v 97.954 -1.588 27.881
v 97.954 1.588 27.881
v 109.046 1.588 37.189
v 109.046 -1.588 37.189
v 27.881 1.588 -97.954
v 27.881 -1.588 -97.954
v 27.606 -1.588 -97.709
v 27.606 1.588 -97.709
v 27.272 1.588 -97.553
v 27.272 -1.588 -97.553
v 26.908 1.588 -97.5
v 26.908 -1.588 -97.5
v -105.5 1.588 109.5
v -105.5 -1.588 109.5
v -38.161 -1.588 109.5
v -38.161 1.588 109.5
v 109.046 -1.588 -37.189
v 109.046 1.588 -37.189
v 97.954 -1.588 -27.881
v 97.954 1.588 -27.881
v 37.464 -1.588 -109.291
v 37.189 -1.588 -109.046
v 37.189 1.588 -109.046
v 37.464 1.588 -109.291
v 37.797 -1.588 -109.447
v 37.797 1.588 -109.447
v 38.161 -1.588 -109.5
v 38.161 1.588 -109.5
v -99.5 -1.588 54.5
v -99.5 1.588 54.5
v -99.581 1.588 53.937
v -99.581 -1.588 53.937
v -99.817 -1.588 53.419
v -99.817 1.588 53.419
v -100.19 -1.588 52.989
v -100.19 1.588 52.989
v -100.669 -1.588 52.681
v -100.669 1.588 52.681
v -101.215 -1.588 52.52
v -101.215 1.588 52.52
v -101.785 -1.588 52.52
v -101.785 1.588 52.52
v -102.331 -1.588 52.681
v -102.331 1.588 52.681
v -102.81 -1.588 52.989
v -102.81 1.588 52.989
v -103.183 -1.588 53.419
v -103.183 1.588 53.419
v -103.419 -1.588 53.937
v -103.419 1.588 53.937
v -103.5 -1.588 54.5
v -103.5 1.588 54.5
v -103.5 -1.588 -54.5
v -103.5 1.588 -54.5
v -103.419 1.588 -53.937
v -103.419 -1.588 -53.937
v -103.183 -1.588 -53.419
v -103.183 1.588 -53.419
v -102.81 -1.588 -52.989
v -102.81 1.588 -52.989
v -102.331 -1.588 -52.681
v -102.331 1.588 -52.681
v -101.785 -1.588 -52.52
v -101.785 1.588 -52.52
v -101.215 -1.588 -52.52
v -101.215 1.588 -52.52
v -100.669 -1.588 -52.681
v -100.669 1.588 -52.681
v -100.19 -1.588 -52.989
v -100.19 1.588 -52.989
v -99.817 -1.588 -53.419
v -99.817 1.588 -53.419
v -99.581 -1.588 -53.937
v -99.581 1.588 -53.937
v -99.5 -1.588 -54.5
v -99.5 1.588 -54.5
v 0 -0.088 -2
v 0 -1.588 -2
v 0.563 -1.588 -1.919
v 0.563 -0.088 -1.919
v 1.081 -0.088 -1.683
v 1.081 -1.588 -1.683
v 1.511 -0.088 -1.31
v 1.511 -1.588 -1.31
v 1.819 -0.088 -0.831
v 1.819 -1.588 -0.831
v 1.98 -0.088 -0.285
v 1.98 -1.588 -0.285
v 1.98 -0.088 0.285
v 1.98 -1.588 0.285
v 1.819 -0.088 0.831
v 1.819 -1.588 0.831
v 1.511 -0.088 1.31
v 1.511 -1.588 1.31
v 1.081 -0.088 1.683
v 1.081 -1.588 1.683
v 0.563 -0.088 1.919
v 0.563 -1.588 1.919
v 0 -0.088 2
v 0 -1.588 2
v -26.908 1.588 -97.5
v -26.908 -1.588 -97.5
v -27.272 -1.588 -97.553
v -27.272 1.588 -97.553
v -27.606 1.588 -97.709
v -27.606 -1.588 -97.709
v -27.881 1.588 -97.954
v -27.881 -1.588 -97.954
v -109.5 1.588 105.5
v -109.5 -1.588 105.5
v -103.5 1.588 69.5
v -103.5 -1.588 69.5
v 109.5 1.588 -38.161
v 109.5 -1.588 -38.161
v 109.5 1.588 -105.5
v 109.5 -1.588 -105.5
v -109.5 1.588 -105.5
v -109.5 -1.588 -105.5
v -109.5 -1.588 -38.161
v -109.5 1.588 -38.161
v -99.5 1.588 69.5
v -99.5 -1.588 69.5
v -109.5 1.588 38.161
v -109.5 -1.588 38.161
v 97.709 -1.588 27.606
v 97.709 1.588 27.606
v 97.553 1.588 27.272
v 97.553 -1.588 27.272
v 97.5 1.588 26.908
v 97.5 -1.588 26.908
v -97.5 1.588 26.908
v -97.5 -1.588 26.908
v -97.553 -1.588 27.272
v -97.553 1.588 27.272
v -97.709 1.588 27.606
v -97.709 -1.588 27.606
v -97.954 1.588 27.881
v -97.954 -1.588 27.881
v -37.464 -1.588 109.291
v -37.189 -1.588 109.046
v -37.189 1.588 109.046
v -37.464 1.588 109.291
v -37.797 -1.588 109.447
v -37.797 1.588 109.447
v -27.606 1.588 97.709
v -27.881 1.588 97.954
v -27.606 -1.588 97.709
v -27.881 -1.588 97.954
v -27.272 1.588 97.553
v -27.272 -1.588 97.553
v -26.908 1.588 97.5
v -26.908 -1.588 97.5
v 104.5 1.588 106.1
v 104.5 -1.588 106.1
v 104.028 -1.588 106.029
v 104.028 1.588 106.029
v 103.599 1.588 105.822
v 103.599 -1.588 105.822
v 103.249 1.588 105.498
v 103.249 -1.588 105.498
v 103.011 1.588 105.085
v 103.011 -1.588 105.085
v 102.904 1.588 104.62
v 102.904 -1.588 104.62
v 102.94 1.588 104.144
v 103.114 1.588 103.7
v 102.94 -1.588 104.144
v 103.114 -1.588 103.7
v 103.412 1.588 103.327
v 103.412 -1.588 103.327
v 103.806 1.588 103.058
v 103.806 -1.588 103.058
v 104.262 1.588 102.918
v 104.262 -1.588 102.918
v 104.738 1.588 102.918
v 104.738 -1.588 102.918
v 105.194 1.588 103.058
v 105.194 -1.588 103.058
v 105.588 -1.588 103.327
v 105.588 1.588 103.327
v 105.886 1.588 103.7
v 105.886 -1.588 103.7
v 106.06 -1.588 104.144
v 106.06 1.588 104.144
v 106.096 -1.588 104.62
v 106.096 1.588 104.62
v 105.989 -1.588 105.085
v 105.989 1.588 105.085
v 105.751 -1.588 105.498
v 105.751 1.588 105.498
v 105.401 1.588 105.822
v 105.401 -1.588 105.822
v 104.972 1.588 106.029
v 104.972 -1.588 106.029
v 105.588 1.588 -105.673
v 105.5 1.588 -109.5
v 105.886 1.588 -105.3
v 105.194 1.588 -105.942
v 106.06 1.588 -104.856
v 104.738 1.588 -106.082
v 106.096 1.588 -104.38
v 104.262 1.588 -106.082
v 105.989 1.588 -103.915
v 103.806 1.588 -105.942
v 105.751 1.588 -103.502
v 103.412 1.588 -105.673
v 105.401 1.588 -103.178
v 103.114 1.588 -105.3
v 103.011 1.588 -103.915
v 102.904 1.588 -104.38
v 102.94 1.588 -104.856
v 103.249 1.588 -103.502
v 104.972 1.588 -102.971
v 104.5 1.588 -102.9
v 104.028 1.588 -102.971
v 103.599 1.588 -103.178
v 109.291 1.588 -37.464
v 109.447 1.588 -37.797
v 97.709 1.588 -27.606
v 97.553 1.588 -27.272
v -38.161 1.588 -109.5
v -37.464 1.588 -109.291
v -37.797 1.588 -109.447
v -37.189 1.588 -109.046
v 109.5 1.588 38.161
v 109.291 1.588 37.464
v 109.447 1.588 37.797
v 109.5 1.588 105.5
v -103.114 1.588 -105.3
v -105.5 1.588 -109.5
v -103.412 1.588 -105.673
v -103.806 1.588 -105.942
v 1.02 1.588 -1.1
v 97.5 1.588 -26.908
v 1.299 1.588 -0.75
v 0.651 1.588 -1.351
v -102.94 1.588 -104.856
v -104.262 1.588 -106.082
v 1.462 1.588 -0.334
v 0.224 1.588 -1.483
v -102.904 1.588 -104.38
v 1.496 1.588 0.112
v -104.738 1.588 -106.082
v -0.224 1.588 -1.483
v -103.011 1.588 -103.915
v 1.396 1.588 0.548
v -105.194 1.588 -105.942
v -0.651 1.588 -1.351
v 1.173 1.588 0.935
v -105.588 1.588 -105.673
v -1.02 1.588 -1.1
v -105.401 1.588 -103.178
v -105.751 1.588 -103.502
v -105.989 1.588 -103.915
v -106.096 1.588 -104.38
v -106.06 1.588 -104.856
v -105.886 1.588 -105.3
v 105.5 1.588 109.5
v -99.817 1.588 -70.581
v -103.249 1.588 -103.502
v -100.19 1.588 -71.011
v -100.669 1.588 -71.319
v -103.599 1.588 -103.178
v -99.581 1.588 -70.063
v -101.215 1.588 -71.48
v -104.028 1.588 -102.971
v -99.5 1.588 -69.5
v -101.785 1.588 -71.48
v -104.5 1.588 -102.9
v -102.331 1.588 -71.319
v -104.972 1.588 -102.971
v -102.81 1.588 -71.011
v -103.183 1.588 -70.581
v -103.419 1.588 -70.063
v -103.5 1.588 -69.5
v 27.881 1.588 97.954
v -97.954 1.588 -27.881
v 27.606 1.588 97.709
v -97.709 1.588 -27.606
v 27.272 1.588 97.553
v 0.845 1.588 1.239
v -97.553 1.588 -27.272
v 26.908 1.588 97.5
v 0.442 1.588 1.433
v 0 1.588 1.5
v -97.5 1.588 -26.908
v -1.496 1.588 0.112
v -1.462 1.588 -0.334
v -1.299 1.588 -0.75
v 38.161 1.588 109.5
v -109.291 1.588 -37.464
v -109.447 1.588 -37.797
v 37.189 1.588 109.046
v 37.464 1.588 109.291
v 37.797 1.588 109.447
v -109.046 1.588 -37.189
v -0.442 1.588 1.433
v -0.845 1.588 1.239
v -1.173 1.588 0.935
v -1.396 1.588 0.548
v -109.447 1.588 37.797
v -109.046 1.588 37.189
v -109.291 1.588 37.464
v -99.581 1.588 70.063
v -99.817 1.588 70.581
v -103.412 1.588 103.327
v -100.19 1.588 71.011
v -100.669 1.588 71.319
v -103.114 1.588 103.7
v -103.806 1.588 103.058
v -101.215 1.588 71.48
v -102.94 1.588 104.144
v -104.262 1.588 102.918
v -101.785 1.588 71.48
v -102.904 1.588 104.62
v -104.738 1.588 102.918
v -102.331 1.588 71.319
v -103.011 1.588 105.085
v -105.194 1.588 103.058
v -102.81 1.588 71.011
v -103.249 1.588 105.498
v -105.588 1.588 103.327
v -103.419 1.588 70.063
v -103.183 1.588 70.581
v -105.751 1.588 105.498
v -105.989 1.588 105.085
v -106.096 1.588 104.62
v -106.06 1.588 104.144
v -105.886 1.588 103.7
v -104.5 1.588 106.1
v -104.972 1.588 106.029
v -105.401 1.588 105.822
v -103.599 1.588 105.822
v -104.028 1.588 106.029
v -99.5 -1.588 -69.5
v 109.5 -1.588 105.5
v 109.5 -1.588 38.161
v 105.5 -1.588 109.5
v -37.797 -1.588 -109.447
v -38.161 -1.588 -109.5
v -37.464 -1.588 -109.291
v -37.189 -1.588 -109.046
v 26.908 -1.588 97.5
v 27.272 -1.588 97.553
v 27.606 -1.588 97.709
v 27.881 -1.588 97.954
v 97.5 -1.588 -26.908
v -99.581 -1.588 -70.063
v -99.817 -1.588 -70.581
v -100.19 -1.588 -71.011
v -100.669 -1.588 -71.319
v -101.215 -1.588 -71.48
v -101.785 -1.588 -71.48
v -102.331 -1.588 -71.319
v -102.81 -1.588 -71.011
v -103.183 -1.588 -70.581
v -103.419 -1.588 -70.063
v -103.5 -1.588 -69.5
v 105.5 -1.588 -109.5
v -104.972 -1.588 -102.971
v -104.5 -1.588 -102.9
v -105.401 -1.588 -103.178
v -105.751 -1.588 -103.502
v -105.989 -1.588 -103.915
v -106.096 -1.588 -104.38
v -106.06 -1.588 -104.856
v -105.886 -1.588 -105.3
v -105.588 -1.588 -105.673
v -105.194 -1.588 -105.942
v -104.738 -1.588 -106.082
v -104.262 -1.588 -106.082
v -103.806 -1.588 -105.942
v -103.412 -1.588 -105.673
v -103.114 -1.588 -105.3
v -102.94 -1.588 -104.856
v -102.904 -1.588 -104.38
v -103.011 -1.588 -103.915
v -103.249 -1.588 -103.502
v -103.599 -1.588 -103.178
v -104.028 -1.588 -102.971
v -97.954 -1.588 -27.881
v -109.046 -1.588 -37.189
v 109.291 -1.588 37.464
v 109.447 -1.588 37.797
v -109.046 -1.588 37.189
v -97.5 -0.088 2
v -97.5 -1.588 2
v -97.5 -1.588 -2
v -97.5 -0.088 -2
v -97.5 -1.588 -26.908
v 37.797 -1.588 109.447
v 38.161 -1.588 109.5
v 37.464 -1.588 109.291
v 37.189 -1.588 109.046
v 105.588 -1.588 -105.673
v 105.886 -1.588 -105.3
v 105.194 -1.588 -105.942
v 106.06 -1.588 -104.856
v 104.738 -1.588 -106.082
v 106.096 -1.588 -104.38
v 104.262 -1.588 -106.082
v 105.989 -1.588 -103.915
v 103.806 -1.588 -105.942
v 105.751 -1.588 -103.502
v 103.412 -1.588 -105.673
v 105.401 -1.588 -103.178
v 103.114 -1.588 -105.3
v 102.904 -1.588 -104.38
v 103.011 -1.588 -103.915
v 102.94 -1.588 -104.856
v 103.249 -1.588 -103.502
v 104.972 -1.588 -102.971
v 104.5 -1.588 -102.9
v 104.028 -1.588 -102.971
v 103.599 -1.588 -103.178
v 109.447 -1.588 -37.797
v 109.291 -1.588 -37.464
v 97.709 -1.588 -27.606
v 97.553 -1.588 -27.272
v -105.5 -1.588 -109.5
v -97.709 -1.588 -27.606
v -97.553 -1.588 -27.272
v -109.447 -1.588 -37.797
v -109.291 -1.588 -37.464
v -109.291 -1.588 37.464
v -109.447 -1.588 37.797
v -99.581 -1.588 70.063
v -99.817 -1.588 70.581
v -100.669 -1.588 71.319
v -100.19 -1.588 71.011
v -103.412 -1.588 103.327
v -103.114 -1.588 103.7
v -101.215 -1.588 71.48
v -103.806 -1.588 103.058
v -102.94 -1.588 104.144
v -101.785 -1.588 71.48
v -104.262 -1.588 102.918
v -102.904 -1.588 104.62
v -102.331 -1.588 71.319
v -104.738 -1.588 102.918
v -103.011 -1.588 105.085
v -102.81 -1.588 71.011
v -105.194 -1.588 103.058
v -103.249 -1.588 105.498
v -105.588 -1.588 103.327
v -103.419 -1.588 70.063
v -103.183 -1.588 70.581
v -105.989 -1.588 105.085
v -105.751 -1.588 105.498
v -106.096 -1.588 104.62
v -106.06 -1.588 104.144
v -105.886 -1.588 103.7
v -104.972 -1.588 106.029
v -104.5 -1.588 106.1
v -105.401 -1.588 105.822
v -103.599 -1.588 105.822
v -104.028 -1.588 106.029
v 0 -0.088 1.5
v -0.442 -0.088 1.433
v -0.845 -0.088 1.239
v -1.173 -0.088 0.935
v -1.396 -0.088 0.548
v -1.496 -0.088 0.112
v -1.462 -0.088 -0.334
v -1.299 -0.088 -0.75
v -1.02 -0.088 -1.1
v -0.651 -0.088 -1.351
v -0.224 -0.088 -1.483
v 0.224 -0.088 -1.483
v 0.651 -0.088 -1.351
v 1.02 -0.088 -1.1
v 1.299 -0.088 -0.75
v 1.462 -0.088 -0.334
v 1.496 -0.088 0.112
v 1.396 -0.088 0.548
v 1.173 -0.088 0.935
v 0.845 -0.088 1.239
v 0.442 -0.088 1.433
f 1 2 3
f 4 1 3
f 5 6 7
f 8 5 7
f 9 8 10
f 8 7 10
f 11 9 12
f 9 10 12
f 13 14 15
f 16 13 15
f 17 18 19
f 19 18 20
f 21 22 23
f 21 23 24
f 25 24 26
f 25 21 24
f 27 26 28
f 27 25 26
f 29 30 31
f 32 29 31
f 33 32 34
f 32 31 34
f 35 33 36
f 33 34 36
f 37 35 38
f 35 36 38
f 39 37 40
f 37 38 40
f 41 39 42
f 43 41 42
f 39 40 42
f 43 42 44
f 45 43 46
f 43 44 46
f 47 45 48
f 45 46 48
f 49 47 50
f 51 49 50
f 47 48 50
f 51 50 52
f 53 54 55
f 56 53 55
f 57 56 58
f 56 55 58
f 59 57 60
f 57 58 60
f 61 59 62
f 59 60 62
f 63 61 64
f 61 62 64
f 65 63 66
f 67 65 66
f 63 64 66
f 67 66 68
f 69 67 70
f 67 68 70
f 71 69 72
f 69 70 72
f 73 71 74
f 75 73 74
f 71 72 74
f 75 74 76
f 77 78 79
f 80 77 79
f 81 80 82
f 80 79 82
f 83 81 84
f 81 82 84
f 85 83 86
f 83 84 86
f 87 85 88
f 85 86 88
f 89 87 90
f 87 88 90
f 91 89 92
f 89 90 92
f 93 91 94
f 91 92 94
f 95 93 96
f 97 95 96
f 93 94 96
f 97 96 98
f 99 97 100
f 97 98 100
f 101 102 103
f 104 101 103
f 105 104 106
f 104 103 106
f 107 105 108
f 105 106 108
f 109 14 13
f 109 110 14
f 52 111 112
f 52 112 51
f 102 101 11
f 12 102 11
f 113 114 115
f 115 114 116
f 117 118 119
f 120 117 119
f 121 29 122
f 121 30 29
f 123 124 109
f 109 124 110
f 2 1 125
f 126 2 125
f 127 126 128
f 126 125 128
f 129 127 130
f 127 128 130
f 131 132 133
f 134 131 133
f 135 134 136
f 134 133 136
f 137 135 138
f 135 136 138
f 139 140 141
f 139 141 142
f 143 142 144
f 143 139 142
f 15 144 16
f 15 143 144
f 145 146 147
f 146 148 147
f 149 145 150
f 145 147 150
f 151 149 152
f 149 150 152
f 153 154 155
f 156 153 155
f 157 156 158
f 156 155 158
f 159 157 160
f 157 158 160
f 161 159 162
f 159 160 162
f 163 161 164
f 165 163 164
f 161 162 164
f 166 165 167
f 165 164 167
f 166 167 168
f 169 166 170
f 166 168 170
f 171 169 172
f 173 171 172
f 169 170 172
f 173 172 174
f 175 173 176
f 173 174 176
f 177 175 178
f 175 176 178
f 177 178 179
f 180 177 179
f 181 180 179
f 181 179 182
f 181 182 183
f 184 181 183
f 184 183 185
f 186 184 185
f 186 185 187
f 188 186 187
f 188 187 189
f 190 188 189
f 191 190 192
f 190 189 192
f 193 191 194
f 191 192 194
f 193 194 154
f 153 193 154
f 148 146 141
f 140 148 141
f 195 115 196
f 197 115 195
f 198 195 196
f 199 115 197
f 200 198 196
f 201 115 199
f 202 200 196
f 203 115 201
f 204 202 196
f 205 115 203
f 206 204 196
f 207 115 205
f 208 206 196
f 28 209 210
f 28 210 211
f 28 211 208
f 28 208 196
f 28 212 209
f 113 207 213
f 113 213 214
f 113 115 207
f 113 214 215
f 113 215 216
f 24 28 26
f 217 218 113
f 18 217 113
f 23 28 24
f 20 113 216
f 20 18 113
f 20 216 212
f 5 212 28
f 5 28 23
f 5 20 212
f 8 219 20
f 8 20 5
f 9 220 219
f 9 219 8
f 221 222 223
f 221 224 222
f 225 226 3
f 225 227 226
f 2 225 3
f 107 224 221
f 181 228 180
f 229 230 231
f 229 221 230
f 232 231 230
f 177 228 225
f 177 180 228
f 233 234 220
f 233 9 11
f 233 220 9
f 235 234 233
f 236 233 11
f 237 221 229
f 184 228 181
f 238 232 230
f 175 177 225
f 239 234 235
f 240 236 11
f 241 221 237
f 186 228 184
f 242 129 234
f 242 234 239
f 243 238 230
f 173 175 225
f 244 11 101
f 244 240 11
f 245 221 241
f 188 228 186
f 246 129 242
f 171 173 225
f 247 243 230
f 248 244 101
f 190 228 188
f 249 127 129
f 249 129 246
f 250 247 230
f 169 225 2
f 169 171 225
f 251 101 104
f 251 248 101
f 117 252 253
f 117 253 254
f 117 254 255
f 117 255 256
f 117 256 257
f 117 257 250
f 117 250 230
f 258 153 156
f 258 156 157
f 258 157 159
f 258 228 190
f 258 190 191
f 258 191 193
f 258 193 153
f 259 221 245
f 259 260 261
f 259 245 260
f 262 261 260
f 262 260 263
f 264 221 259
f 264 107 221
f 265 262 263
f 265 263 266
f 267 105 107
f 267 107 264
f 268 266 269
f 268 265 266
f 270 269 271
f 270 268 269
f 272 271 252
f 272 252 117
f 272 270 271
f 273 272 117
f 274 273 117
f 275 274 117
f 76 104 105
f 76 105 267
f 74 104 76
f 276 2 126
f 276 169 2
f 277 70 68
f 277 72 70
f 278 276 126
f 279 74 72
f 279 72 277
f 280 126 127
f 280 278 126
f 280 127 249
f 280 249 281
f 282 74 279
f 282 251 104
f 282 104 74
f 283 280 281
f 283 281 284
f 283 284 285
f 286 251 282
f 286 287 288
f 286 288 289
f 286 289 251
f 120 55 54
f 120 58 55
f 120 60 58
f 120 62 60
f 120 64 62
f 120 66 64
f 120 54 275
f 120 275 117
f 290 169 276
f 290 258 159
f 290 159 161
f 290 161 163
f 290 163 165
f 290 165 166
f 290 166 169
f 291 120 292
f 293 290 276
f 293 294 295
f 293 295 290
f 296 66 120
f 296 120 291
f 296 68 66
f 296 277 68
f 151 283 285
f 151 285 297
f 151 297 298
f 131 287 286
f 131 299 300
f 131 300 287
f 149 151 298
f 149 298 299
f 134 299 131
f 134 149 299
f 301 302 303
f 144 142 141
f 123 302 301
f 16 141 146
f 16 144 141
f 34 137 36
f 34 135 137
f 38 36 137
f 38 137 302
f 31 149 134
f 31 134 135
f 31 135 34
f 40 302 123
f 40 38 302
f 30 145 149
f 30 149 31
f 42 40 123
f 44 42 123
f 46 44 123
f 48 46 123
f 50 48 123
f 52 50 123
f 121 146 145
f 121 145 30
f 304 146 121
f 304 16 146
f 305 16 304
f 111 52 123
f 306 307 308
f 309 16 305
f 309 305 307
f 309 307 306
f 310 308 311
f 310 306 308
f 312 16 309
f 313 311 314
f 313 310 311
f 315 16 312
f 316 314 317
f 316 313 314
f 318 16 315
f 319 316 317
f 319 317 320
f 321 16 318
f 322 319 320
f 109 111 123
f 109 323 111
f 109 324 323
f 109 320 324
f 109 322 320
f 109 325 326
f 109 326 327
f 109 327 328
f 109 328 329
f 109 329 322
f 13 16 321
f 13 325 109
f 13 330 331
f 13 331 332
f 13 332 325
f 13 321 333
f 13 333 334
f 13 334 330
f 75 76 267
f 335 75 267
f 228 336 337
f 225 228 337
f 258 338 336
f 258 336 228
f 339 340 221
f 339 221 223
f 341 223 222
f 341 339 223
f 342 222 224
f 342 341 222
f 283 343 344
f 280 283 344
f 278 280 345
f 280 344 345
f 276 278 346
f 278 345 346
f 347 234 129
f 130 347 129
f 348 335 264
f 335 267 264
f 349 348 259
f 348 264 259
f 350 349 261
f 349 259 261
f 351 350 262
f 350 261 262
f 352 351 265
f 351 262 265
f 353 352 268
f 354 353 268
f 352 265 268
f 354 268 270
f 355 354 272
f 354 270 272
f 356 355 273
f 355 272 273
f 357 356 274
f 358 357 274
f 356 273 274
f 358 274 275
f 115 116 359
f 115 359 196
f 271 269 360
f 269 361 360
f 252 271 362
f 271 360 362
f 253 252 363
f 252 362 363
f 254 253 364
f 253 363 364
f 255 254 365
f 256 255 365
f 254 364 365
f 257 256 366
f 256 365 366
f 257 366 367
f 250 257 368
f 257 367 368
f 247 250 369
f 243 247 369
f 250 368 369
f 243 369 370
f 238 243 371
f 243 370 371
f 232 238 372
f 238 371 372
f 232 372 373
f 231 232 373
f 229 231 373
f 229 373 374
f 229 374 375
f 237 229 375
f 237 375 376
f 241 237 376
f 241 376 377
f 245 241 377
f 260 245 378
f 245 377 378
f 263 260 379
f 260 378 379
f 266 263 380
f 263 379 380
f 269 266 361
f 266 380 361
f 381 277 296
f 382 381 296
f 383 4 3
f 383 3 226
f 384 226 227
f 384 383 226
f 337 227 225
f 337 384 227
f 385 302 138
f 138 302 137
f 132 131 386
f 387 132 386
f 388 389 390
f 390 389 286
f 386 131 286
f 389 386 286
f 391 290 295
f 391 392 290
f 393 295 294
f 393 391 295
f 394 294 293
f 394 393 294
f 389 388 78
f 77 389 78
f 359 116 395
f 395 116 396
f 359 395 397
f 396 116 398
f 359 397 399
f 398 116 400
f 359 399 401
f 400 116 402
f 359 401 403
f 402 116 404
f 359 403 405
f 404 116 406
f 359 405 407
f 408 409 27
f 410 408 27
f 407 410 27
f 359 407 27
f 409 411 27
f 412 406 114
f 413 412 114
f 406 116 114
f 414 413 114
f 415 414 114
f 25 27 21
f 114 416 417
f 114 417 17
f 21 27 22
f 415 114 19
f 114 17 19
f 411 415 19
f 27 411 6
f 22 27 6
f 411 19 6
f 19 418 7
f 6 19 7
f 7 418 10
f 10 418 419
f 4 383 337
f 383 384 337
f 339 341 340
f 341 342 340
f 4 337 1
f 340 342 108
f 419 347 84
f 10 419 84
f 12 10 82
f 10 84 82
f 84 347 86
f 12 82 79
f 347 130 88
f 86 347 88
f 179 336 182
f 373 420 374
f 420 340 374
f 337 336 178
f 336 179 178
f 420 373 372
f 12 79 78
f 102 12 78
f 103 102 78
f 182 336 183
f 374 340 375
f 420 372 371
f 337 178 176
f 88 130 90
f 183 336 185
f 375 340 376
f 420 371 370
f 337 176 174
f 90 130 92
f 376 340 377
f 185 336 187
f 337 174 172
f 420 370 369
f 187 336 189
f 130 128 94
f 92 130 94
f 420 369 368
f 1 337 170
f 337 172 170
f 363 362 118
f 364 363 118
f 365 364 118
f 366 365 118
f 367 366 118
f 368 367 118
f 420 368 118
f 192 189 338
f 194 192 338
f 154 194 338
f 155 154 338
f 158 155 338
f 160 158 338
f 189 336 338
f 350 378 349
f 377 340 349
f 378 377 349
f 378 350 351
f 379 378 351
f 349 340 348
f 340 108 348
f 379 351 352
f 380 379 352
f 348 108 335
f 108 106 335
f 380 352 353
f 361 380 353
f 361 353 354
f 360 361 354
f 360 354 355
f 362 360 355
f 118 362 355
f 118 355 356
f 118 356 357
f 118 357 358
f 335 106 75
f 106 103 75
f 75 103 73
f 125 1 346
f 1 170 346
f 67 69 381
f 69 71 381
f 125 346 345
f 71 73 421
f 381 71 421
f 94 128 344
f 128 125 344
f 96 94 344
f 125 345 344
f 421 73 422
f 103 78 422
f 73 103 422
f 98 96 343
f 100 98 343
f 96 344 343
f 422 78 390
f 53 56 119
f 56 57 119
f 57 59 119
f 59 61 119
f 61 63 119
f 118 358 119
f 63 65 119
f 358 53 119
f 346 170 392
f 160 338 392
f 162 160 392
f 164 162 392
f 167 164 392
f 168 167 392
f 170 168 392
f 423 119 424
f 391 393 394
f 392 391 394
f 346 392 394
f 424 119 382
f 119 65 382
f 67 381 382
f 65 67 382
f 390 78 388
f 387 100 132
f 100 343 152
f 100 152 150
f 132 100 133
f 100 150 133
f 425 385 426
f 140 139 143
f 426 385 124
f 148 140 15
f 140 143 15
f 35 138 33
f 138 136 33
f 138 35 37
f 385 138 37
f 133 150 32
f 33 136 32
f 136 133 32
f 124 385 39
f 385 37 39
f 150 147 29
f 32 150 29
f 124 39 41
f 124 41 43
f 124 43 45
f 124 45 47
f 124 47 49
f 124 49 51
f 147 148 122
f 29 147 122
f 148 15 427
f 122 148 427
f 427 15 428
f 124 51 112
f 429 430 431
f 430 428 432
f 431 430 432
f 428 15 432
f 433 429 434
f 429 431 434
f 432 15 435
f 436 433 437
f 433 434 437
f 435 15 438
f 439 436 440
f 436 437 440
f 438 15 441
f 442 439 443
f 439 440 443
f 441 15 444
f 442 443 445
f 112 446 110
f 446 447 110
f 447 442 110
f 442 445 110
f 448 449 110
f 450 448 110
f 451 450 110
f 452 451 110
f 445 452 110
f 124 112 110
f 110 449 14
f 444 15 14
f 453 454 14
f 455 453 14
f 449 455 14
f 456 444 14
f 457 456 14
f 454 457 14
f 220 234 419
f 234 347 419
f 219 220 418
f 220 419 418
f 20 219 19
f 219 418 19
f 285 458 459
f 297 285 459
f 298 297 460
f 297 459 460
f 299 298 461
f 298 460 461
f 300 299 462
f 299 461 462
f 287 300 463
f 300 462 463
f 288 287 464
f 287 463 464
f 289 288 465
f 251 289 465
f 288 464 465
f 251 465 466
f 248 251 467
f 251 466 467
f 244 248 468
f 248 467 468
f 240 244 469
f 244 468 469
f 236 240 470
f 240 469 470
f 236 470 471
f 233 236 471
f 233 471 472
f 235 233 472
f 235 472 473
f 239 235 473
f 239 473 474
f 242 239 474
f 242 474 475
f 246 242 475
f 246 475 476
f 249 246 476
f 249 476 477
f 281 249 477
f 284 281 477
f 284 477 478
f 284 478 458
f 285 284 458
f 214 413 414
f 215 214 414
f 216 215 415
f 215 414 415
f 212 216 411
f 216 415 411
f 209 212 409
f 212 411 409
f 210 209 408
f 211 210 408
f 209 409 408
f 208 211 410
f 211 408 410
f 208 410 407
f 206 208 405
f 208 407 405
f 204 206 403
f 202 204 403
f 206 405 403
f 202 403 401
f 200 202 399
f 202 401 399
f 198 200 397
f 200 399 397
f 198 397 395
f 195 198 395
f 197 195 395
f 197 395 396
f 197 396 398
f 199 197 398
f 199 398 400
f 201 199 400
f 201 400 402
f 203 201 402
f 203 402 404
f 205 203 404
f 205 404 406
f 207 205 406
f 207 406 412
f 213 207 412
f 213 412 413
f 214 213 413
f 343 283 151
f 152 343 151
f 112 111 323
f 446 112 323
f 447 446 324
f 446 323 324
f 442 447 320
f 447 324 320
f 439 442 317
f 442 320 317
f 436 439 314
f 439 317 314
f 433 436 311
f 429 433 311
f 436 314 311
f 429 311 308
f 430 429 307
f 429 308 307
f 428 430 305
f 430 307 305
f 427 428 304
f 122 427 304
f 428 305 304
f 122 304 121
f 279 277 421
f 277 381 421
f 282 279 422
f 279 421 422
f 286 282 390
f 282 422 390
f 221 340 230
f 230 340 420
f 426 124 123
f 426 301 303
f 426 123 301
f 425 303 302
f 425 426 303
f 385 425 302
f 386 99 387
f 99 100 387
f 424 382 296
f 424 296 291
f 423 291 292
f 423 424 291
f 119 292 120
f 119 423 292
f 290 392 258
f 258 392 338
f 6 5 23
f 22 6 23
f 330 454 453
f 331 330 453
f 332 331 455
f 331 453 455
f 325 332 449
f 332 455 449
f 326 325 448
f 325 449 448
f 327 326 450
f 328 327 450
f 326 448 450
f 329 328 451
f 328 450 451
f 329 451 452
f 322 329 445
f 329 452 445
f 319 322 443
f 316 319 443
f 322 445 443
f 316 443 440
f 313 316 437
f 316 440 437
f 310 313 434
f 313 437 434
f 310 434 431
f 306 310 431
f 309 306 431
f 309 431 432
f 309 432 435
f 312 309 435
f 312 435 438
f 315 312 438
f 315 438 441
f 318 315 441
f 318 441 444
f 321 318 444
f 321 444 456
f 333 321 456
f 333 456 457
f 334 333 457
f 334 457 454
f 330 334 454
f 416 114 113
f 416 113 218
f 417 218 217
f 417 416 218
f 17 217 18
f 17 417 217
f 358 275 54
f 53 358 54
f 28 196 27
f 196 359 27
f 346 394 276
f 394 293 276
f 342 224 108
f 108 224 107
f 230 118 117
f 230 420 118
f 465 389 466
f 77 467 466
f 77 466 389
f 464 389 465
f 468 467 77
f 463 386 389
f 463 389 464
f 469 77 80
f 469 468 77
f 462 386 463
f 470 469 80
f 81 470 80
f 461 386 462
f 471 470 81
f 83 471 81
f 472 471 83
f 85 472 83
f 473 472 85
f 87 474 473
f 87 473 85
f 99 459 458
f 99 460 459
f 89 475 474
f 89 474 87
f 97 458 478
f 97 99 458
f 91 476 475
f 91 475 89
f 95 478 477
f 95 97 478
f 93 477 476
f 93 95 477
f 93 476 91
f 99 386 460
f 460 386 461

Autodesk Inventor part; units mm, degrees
ref_plane "YZ Plane" through (0, 0, 0) normal (1, 0, 0) x (0, 1, 0)
ref_plane "XZ Plane" through (0, 0, 0) normal (0, 1, 0) x (-1, 0, 0)
ref_plane "XY Plane" through (0, 0, 0) normal (0, 0, 1) x (1, 0, 0)
sketch "Sketch1" plane through (0, 0, 0) normal (0, 1, 0) x (-1, 0, 0)
  line L0 (109.5, 109.5) -> (-109.5, 109.5)
  line L1 (-109.5, 109.5) -> (-109.5, -109.5)
  line L2 (-109.5, -109.5) -> (109.5, -109.5)
  line L3 (109.5, -109.5) -> (109.5, 109.5)
  line L4 (109.5, 109.5) -> (-109.5, -109.5) construction
  line L5 (-109.5, 109.5) -> (109.5, -109.5) construction
  point P0 (0, 0)
  dimension "d0" = 219
extrude "Extrusion1" add sketch "Sketch1" along normal mid plane 3.175
sketch "Sketch2" plane through (0, 1.5875, 0) normal (0, 1, 0) x (1, 0, 0)
  line L0 (-109.5, -109.5) -> (109.5, -109.5) construction
  line L1 (109.5, -109.5) -> (109.5, 109.5) construction
  line L2 (109.5, 109.5) -> (-109.5, 109.5) construction
  line L3 (-109.5, 109.5) -> (-109.5, -109.5) construction
  line L4 (-37.5692, 109.5) -> (-27.5, 97.5)
  line L5 (-27.5, 97.5) -> (27.5, 97.5)
  line L6 (27.5, 97.5) -> (37.5692, 109.5)
  line L7 (37.5692, 109.5) -> (-37.5692, 109.5)
  line L8 (-97.5, -27.5) -> (-97.5, 27.5)
  line L9 (-109.5, -37.5692) -> (-97.5, -27.5)
  line L10 (-109.5, 37.5692) -> (-109.5, -37.5692)
  line L11 (-97.5, 27.5) -> (-109.5, 37.5692)
  line L12 (27.5, -97.5) -> (-27.5, -97.5)
  line L13 (37.5692, -109.5) -> (27.5, -97.5)
  line L14 (-37.5692, -109.5) -> (37.5692, -109.5)
  line L15 (-27.5, -97.5) -> (-37.5692, -109.5)
  line L16 (97.5, 27.5) -> (97.5, -27.5)
  line L17 (109.5, 37.5692) -> (97.5, 27.5)
  line L18 (109.5, -37.5692) -> (109.5, 37.5692)
  line L19 (97.5, -27.5) -> (109.5, -37.5692)
  line L20 (-101.5, 69.5) -> (-101.5, 54.5) construction
  line L21 (-103.5, 69.5) -> (-103.5, 54.5)
  line L22 (-99.5, 54.5) -> (-99.5, 69.5)
  arc A0 (-99.5, 69.5) -> (-103.5, 69.5) centre (-101.5, 69.5) ccw
  arc A1 (-103.5, 54.5) -> (-99.5, 54.5) centre (-101.5, 54.5) ccw
  line L23 (0, 0) -> (-31.1886, 0)
  line L24 (-103.5, -69.5) -> (-103.5, -54.5)
  line L25 (-99.5, -54.5) -> (-99.5, -69.5)
  arc A2 (-103.5, -69.5) -> (-99.5, -69.5) centre (-101.5, -69.5) ccw
  arc A3 (-99.5, -54.5) -> (-103.5, -54.5) centre (-101.5, -54.5) ccw
  point P0 (0, 109.5)
  point P1 (-109.5, 0)
  point P2 (0, -109.5)
  point P3 (109.5, 0)
  point P4 (-101.5, 62)
  dimension "d5" = 55
  dimension "d8" = 360
  dimension "d10" = 195
  dimension "d32" = 4
  dimension "d33" = 15
  dimension "d34" = 52.5
  dimension "d35" = 6
  dimension "d36" = 50
extrude "Extrusion2" cut sketch "Sketch2" against normal blind 3.175
chamfer "Chamfer1" distance 4 angle 45 4 edges at (-109.5, 0, 109.5) (-109.5, 0, -109.5) (109.5, 0, -109.5) (109.5, 0, 109.5)
sketch "Sketch3" plane through (0, 1.5875, 0) normal (0, 1, 0) x (1, 0, 0)
  line L0 (-104.5, -104.5) -> (104.5, -104.5) construction
  line L1 (104.5, -104.5) -> (104.5, 104.5) construction
  line L2 (104.5, 104.5) -> (-104.5, 104.5) construction
  line L3 (-104.5, 104.5) -> (-104.5, -104.5) construction
  line L4 (-104.5, -104.5) -> (104.5, 104.5) construction
  line L5 (104.5, -104.5) -> (-104.5, 104.5) construction
  line L6 (-78.5, 50) -> (-46.5, 50) construction
  line L7 (-78.5, -50) -> (-46.5, -50) construction
  line L8 (46.5, 0) -> (78.5, 0) construction
  point P0 (0, 0)
  point P1 (0, 0)
  dimension "d16" = 209
  dimension "d17" = 209
  dimension "d18" = 32
  dimension "d20" = 46.5
  dimension "d21" = 46.5
  dimension "d22" = 100
  dimension "d23" = 50
  dimension "d24" = 93
hole "Hole1" at (-104.5, 1.5875, -104.5) at (104.5, 1.5875, -104.5) at (104.5, 1.5875, 104.5) at (-104.5, 1.5875, 104.5) direction (0, -1, 0) diameter 3.2 end through all
fillet "Fillet1" radius 1.27 16 edges at (-109.5, 0, -37.5692) (-97.5, 0, -27.5) (-97.5, 0, 27.5) (-109.5, 0, 37.5692) (-27.5, 0, 97.5) (27.5, 0, 97.5) (37.5692, 0, 109.5) (-37.5692, 0, 109.5) (109.5, 0, -37.5692) (97.5, 0, -27.5) (97.5, 0, 27.5) (109.5, 0, 37.5692) (-37.5692, 0, -109.5) (-27.5, 0, -97.5) (27.5, 0, -97.5) (37.5692, 0, -109.5)
sketch "Sketch6" plane through (0, 1.5875, 0) normal (0, 1, 0) x (1, 0, 0)
  point P0 (0, 0)
hole "Hole3" at (0, 1.5875, 0) direction (0, -1, 0) diameter 3 end through all
sketch "Sketch7" plane through (0, -1.5875, 0) normal (0, -1, 0) x (1, 0, 0)
  circle A0 centre (0, 0) radius 1.5 projected
  circle A1 centre (0, 0) radius 1.5 projected
  line L0 (0, 0) -> (-97.5, 0) construction
  line L1 (0, 2) -> (-97.5, 2)
  line L2 (-97.5, -2) -> (0, -2)
  arc A2 (0, -2) -> (0, 2) centre (0, 0) ccw
  arc A3 (-97.5, 2) -> (-97.5, -2) centre (-97.5, 0) ccw
  line L3 (-97.5, 26.9078) -> (-97.5, -26.9078) projected
  point P0 (-48.75, 0)
  dimension "d59" = 4
extrude "Extrusion4" cut sketch "Sketch7" against normal blind 1.5 contours A2 L2 L3 L1
equation "\"d21\" = d20"
properties part number "HotBed_Plate_LM6018" material "Aluminum 6061"
